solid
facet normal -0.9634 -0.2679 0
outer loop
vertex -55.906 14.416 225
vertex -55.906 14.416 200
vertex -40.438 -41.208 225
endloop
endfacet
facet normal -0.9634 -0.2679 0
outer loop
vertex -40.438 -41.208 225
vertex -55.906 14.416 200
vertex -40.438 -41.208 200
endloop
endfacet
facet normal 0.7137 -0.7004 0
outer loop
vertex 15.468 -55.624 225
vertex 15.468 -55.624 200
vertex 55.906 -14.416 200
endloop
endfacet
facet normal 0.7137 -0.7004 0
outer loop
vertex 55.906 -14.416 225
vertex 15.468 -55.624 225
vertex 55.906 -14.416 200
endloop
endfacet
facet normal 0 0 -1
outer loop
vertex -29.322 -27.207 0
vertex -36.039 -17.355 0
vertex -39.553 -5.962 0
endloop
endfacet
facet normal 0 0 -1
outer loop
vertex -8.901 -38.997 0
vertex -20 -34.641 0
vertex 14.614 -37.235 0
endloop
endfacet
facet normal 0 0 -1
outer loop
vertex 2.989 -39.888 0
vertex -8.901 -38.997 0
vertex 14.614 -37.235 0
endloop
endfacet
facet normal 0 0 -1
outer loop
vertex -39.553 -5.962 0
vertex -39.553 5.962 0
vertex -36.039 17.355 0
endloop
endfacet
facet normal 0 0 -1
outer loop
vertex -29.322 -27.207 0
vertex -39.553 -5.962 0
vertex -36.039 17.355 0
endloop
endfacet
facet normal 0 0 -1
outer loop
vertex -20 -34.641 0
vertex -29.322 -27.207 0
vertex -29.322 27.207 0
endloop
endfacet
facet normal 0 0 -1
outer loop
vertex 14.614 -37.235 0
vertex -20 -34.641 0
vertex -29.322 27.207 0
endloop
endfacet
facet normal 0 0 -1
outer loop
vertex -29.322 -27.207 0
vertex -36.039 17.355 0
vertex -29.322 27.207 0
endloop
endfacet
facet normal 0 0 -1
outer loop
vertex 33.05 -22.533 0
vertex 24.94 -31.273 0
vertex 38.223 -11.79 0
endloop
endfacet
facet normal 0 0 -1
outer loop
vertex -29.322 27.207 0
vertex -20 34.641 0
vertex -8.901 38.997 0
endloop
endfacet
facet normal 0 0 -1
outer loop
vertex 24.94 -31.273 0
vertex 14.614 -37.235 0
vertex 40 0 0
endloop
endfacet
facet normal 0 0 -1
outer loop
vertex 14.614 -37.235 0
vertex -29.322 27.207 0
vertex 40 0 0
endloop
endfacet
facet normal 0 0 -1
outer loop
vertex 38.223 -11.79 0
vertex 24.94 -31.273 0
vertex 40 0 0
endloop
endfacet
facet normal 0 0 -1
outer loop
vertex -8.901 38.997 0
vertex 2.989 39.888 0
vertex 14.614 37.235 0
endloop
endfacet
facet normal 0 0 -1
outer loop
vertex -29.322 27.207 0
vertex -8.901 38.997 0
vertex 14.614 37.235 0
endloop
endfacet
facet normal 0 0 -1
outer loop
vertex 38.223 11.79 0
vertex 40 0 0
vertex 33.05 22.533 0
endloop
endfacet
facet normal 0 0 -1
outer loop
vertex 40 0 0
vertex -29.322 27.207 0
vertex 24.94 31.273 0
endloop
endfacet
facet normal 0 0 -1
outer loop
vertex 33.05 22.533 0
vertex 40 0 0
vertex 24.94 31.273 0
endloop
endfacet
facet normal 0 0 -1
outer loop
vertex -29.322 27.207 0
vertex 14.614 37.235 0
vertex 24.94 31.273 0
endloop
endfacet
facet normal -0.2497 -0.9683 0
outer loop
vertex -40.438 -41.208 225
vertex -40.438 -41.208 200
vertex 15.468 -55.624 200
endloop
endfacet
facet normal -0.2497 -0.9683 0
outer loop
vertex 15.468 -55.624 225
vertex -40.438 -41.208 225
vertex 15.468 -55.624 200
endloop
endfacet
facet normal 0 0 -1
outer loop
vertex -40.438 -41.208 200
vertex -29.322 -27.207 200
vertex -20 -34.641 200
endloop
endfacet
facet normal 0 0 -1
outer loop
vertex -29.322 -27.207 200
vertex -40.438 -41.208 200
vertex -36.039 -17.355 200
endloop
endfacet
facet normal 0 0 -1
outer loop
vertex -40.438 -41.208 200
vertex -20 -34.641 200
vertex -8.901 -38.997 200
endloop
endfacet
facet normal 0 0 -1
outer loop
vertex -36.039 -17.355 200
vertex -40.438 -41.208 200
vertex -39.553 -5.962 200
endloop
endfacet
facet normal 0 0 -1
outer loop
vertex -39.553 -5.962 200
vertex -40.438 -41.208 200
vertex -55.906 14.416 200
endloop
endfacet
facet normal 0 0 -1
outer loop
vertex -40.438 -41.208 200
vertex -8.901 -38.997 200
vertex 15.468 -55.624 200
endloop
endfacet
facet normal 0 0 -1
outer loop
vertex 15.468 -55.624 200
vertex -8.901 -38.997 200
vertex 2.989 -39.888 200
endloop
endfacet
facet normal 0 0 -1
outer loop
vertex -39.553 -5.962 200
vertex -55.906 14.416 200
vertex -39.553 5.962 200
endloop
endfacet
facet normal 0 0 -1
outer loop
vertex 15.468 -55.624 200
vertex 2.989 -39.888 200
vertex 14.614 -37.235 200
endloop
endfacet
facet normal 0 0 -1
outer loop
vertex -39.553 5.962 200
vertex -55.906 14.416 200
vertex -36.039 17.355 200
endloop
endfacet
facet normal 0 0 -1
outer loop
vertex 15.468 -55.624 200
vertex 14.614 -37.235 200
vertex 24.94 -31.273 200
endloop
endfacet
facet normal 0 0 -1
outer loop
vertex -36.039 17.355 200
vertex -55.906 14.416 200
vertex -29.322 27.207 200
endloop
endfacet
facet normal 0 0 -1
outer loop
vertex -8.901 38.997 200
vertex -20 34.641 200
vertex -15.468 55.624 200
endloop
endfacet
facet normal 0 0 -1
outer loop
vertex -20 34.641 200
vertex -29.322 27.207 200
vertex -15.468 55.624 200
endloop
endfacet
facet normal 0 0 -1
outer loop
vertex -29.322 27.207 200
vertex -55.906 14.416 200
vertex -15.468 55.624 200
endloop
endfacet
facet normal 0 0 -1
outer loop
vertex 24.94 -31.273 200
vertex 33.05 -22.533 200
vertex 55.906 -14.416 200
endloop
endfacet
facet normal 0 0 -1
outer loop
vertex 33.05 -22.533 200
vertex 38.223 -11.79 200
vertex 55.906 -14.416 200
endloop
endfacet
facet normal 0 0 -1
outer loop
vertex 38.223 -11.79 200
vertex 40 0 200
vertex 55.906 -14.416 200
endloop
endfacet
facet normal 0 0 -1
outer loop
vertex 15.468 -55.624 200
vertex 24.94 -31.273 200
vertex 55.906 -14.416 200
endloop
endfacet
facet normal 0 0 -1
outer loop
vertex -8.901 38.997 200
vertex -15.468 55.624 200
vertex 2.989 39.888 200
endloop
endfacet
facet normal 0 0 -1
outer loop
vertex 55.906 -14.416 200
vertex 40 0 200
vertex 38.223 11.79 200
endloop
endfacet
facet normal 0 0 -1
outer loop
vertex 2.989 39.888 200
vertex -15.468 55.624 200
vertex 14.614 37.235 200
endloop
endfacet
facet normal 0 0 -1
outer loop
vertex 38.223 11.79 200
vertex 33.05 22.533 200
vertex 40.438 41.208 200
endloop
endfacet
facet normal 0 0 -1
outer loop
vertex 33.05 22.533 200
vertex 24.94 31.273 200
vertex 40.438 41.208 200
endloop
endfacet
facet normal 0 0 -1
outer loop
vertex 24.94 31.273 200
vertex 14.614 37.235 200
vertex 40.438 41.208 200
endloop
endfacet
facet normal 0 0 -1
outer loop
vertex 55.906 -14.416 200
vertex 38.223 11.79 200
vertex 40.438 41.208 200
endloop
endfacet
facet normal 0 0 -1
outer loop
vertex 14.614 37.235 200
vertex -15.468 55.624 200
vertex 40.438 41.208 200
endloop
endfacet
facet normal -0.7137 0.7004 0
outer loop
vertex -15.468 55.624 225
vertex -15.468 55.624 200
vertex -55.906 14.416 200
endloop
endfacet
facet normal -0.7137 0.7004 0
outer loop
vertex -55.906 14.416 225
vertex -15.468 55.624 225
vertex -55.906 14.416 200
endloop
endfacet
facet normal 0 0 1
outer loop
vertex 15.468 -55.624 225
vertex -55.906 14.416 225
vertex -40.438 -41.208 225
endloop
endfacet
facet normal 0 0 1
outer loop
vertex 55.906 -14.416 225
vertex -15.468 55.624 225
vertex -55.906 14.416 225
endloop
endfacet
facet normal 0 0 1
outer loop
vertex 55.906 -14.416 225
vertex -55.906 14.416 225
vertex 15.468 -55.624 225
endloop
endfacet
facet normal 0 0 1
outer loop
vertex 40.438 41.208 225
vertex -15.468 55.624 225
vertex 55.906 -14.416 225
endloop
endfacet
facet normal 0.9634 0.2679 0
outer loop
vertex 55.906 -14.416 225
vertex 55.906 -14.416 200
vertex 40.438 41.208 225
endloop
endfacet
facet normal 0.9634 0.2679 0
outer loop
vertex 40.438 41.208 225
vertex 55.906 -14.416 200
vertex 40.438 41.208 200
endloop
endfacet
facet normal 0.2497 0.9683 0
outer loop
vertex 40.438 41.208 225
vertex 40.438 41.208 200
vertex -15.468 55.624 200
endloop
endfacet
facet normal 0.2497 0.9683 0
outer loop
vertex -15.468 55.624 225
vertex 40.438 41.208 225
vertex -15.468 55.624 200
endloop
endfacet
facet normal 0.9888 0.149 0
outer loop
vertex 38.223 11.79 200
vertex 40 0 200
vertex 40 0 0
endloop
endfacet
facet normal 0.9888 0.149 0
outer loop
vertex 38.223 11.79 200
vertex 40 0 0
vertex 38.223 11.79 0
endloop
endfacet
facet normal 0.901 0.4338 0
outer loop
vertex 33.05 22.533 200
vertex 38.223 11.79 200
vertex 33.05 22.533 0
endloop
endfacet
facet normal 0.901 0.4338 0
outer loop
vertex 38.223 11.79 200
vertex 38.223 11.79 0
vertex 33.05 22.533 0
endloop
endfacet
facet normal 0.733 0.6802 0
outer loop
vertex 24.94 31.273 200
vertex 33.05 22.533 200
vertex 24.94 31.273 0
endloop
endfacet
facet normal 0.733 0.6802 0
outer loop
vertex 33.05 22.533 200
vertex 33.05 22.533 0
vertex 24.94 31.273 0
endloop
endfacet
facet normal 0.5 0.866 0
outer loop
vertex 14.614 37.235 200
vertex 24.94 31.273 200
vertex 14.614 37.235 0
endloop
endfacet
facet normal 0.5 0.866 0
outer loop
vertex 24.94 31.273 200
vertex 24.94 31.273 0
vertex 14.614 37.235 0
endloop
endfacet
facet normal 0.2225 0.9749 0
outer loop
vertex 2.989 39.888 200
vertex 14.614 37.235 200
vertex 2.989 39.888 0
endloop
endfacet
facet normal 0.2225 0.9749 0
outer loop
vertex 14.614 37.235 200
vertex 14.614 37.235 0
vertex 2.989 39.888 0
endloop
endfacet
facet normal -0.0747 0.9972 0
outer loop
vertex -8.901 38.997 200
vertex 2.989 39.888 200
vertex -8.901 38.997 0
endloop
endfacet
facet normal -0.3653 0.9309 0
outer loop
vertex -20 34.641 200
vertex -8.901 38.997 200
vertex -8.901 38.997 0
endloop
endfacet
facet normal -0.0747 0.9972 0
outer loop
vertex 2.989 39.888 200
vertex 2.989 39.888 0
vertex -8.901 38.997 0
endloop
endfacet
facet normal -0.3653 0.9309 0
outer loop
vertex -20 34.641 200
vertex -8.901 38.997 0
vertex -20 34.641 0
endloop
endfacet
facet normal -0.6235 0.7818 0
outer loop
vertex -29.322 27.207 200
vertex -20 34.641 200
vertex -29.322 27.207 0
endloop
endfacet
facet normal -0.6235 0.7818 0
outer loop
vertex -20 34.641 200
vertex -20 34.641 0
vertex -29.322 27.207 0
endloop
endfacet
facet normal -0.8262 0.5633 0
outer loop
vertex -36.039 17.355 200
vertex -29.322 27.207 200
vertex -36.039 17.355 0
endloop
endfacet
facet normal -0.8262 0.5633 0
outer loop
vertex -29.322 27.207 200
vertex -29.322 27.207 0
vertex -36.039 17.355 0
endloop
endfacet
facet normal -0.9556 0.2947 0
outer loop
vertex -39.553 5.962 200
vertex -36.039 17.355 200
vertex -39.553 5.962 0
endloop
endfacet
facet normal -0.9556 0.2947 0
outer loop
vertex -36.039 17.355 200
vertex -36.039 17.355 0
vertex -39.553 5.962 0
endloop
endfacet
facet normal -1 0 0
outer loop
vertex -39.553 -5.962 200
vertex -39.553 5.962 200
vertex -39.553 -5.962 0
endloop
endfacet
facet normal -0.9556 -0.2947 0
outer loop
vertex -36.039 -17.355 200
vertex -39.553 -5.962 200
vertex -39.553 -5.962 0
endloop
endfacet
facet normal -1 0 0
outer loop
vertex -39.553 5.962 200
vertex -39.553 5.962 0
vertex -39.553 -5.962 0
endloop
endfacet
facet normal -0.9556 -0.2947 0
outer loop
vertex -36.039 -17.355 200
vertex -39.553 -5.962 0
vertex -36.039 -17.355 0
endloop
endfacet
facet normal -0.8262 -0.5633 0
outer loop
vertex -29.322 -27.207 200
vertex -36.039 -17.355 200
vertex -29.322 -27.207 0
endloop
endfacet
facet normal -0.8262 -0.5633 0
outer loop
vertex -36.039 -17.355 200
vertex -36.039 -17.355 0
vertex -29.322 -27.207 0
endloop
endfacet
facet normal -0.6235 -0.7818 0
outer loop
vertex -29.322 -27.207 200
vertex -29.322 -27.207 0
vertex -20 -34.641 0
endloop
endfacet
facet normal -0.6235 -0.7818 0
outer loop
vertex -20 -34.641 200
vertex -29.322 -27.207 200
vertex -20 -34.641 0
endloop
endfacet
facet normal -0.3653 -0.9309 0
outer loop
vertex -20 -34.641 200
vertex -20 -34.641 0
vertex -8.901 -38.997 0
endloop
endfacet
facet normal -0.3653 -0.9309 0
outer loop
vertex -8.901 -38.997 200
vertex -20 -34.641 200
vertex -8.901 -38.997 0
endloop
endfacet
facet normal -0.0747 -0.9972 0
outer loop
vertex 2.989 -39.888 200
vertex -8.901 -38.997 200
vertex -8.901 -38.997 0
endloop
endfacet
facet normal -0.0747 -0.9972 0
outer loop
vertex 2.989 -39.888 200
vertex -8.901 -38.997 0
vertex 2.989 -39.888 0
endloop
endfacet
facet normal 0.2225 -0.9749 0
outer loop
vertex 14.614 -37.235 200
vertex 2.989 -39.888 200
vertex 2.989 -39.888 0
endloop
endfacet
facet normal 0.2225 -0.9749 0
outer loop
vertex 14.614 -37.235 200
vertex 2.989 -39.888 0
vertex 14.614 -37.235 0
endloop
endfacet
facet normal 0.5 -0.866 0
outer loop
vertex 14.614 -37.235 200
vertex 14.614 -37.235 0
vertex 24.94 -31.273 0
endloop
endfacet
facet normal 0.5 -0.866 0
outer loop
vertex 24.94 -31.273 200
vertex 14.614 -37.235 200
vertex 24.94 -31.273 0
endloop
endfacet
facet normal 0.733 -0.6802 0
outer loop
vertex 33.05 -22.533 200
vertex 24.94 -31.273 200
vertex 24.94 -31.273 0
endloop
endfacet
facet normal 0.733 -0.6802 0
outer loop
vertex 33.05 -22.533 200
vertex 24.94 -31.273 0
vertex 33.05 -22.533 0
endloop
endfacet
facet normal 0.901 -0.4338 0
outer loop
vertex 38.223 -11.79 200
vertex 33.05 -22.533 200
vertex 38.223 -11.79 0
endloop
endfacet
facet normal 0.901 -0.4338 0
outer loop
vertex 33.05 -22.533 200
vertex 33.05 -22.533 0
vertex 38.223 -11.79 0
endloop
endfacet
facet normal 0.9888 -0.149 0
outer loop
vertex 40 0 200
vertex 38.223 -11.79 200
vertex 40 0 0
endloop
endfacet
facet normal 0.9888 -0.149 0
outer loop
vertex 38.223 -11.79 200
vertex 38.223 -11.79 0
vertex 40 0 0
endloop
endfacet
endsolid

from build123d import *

# Parameters (mm, degrees)
ESQUISSE1_R        = 40
BOSS_EXTRU_1_DEPTH = 200
BOSS_EXTRU_2_DEPTH = 25


with BuildPart() as part:
    # Esquisse1 → Boss.-Extru.1 (new body)
    with BuildSketch(Plane.XY):
        Circle(ESQUISSE1_R)
    extrude(amount=BOSS_EXTRU_1_DEPTH)

    # Esquisse2 → Boss.-Extru.2 (add)
    with BuildSketch(Plane.XY.offset(200)):
        Polygon((55.906189806, -14.416354416), (40.438024058, 41.208003393), (-15.468165749, 55.624357809), (-55.906189806, 14.416354416), (-40.438024058, -41.208003393), (15.468165749, -55.624357809), align=None)
    extrude(amount=BOSS_EXTRU_2_DEPTH)


solid = part.part
